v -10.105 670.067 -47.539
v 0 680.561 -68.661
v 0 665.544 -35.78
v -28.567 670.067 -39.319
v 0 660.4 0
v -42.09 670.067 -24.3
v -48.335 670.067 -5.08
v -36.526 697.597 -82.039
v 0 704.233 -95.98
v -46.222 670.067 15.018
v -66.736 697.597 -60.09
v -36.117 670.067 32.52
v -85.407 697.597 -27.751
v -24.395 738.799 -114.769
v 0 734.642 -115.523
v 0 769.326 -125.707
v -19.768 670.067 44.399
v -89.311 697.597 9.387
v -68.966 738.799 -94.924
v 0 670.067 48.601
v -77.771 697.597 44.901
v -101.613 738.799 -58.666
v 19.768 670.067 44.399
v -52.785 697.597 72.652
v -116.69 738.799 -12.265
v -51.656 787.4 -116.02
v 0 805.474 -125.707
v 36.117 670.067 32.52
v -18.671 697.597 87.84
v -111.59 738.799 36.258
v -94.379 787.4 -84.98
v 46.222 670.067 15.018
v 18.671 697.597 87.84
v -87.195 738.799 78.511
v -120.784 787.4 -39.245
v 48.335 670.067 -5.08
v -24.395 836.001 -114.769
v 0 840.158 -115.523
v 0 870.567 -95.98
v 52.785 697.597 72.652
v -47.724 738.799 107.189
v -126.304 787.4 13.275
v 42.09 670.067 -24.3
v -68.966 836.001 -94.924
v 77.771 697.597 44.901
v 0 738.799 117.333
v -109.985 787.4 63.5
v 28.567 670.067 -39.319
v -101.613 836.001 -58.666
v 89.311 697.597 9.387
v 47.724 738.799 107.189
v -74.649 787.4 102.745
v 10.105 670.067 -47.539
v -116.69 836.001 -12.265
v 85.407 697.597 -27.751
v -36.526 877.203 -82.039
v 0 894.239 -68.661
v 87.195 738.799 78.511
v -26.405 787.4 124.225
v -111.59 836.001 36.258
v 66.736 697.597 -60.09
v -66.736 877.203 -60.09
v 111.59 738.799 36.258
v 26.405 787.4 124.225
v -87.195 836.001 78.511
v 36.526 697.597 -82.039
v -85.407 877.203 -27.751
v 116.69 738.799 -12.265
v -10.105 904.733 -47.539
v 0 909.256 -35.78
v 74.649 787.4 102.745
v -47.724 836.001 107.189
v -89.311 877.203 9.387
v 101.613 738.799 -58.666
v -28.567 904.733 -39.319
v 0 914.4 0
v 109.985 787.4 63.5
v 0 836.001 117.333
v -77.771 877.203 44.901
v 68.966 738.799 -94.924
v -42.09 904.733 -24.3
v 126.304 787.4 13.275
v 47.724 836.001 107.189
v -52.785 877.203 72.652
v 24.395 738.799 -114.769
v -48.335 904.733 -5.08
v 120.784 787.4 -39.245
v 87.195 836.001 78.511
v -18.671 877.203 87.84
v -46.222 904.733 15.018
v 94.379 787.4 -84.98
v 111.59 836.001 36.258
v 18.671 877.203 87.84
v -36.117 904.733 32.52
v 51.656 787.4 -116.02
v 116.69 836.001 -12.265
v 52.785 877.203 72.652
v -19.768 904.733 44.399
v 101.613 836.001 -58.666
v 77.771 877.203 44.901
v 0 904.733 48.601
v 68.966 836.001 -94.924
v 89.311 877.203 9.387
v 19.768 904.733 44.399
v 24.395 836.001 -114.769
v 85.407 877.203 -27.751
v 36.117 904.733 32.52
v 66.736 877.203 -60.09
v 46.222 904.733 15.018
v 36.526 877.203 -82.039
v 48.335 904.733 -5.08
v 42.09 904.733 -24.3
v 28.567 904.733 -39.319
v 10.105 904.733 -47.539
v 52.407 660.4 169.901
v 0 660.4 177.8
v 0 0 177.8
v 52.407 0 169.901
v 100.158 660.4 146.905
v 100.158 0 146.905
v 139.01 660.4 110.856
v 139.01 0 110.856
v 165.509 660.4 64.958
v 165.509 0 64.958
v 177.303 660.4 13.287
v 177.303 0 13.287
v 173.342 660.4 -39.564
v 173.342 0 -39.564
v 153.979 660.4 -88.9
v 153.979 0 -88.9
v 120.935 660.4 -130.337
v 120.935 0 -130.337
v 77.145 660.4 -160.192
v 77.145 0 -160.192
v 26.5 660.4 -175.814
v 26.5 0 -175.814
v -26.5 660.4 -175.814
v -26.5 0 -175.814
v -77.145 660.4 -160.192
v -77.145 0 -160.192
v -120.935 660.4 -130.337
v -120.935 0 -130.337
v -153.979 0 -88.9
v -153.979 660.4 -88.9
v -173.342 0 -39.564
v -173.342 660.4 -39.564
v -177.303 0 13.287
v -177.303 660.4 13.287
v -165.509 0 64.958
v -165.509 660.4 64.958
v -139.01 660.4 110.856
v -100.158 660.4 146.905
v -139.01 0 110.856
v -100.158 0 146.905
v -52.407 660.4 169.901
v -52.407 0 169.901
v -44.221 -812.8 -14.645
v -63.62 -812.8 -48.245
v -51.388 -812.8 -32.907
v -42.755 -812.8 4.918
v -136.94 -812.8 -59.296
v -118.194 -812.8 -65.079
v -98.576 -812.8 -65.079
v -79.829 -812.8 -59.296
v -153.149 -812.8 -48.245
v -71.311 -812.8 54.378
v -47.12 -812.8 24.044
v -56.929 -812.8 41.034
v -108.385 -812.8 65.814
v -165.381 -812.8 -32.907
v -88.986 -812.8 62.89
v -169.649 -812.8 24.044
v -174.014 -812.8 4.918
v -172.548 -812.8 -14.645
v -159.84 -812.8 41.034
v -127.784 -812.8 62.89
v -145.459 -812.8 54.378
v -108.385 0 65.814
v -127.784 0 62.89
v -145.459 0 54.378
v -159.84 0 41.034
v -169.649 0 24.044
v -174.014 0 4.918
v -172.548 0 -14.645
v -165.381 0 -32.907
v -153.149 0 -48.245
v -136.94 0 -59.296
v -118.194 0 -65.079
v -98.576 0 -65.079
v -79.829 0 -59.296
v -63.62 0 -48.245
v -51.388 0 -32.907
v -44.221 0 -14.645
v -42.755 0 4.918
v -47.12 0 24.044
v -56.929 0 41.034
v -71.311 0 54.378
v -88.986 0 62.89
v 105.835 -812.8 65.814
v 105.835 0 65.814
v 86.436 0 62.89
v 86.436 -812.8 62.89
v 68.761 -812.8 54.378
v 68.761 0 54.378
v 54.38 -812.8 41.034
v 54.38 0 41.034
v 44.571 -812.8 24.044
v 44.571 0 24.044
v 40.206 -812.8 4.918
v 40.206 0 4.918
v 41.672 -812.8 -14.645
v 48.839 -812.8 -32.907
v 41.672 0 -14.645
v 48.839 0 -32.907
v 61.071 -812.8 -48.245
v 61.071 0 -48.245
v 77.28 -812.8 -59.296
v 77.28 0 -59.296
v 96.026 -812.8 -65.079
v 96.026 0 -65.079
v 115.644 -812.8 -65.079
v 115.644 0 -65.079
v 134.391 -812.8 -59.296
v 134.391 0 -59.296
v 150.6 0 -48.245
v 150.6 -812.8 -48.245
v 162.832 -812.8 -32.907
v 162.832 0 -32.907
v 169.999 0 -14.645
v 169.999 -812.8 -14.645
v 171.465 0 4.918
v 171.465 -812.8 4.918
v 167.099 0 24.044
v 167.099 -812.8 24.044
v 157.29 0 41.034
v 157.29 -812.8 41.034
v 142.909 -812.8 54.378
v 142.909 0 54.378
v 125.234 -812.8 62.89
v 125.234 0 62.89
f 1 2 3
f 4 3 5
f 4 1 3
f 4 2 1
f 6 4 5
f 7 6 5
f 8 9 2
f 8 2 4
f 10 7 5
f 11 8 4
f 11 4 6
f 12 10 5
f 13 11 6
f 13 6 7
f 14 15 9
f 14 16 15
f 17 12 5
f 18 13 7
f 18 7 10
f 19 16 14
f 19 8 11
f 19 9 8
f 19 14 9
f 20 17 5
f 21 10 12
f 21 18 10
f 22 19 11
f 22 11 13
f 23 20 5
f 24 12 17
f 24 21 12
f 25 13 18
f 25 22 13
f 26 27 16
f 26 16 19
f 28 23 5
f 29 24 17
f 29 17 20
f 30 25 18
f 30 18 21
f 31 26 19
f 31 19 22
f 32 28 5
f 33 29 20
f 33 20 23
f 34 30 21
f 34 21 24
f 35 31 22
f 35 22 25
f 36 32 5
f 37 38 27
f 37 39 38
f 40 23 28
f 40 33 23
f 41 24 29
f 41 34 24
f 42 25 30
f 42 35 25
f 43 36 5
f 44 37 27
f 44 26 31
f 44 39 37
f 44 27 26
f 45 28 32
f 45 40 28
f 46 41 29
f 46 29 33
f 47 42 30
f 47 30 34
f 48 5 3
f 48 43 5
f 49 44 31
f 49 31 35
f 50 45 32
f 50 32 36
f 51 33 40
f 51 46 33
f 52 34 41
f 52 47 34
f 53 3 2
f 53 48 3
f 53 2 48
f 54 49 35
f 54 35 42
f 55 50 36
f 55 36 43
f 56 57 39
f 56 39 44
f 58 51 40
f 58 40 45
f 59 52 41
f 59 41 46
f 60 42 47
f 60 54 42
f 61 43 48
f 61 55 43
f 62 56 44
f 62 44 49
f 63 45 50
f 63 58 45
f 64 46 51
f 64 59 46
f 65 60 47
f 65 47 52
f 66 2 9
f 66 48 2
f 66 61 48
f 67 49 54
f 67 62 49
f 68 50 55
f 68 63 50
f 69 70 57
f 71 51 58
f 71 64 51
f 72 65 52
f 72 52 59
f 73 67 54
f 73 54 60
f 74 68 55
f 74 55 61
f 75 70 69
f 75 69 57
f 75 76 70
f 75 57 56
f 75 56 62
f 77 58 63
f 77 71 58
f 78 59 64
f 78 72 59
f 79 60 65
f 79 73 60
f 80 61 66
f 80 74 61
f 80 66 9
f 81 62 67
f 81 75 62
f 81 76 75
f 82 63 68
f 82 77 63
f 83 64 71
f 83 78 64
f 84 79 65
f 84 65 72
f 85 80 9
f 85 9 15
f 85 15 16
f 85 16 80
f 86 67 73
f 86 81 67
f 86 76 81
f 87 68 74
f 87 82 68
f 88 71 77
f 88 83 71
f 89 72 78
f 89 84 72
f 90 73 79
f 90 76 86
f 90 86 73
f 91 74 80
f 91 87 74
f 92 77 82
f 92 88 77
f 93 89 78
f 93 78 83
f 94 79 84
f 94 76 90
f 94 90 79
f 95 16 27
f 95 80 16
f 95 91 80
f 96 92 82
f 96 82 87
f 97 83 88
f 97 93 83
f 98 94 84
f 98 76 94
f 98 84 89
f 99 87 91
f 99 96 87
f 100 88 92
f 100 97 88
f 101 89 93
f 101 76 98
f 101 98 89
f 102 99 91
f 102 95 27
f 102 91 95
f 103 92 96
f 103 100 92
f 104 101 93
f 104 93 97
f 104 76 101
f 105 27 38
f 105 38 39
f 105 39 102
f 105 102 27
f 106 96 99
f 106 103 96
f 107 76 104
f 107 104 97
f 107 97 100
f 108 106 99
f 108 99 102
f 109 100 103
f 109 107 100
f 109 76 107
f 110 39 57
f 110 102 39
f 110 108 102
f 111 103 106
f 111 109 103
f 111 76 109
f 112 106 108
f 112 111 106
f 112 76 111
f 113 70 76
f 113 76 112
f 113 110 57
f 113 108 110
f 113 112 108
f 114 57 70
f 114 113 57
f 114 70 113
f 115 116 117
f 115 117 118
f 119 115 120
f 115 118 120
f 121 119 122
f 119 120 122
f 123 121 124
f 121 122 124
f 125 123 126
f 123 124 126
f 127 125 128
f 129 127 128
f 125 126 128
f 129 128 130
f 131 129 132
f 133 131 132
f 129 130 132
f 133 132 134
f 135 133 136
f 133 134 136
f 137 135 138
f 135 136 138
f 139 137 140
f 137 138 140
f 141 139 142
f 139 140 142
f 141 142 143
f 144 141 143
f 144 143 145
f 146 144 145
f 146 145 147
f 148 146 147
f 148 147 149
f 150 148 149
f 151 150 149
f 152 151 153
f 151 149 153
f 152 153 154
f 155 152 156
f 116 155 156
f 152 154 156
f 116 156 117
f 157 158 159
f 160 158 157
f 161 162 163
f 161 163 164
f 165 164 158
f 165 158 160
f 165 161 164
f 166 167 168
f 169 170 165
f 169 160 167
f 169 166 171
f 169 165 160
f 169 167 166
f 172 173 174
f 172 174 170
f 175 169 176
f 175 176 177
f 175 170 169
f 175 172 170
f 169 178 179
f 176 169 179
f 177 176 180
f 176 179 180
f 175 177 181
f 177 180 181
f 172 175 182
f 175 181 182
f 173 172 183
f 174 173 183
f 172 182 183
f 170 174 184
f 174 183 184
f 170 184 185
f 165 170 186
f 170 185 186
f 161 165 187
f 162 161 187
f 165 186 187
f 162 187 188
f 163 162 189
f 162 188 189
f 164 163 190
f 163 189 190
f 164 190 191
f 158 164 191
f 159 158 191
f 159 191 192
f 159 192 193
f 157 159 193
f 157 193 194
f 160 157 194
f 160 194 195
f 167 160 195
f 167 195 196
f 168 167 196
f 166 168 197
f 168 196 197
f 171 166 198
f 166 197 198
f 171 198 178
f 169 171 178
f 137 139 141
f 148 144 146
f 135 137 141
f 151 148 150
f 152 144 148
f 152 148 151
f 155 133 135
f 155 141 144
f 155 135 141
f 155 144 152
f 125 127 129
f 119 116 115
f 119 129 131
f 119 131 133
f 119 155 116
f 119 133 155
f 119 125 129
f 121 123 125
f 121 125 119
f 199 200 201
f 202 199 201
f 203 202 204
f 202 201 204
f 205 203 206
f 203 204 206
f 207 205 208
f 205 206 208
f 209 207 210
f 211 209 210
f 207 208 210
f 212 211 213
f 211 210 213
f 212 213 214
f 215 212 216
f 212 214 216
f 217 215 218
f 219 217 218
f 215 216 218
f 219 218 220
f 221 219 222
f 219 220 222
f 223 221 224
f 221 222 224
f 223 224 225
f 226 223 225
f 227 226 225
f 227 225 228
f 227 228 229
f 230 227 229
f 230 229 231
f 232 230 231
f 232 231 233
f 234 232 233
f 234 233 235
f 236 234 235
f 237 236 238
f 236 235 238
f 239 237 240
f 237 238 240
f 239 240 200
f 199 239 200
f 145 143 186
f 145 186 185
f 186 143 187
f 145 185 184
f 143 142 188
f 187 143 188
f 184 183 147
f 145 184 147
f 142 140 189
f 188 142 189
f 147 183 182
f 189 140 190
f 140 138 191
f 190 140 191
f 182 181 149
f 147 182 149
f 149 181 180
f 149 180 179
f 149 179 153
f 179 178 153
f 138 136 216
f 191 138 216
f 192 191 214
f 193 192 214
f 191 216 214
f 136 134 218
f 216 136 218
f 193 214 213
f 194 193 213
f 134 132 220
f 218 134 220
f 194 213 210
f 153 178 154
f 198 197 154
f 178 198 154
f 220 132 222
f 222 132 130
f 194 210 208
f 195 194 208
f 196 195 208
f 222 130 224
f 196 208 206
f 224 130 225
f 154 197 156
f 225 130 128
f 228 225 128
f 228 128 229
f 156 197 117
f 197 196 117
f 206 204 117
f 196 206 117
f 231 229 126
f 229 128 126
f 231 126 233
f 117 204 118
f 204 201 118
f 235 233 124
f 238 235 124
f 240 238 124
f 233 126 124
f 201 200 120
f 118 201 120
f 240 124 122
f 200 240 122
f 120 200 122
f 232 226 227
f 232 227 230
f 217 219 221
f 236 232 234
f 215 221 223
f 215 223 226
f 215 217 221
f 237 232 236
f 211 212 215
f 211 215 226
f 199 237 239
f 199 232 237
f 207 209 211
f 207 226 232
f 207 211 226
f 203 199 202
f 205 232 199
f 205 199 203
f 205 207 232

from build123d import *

# Parameters (mm, degrees)
SKETCH1_R           = 177.8
BOSS_EXTRUDE1_DEPTH = 660.4
SKETCH3_R           = 65.813617278
BOSS_EXTRUDE2_DEPTH = 812.8


with BuildPart() as part:
    # Sketch1 → Boss-Extrude1 (new body)
    with BuildSketch(Plane(origin=(0, 0, 0), x_dir=(1, 0, 0), z_dir=(0, 1, 0))):
        with Locations(Location((0, 0, 0), (0, 0, 270))):
            Circle(SKETCH1_R)
    extrude(amount=BOSS_EXTRUDE1_DEPTH)

    # Sketch3 → Boss-Extrude2 (add)
    with BuildSketch(Plane(origin=(0, 0, 0), x_dir=(-1, 0, 0), z_dir=(0, -1, 0))):
        with Locations(Location((108.384656073, 0, 0), (0, 0, 270))):
            Circle(SKETCH3_R)
        with Locations(Location((-105.835290589, 0, 0), (0, 0, 270))):
            Circle(SKETCH3_R)
    extrude(amount=BOSS_EXTRUDE2_DEPTH)


with BuildPart() as body_2:
    # Sketch2 → Revolve1 (revolve)
    with BuildSketch(Plane(origin=(0, 0, 0), x_dir=(0, 0, -1), z_dir=(1, 0, 0))):
        with BuildLine():
            Line((0, 914.4), (0, 660.4))
            ThreePointArc((0, 660.4), (127, 787.4), (0, 914.4))
        make_face()
    revolve(axis=Axis((0, 660.4, 0), (0, 1, 0)))


solid = Compound([part.part, body_2.part])
